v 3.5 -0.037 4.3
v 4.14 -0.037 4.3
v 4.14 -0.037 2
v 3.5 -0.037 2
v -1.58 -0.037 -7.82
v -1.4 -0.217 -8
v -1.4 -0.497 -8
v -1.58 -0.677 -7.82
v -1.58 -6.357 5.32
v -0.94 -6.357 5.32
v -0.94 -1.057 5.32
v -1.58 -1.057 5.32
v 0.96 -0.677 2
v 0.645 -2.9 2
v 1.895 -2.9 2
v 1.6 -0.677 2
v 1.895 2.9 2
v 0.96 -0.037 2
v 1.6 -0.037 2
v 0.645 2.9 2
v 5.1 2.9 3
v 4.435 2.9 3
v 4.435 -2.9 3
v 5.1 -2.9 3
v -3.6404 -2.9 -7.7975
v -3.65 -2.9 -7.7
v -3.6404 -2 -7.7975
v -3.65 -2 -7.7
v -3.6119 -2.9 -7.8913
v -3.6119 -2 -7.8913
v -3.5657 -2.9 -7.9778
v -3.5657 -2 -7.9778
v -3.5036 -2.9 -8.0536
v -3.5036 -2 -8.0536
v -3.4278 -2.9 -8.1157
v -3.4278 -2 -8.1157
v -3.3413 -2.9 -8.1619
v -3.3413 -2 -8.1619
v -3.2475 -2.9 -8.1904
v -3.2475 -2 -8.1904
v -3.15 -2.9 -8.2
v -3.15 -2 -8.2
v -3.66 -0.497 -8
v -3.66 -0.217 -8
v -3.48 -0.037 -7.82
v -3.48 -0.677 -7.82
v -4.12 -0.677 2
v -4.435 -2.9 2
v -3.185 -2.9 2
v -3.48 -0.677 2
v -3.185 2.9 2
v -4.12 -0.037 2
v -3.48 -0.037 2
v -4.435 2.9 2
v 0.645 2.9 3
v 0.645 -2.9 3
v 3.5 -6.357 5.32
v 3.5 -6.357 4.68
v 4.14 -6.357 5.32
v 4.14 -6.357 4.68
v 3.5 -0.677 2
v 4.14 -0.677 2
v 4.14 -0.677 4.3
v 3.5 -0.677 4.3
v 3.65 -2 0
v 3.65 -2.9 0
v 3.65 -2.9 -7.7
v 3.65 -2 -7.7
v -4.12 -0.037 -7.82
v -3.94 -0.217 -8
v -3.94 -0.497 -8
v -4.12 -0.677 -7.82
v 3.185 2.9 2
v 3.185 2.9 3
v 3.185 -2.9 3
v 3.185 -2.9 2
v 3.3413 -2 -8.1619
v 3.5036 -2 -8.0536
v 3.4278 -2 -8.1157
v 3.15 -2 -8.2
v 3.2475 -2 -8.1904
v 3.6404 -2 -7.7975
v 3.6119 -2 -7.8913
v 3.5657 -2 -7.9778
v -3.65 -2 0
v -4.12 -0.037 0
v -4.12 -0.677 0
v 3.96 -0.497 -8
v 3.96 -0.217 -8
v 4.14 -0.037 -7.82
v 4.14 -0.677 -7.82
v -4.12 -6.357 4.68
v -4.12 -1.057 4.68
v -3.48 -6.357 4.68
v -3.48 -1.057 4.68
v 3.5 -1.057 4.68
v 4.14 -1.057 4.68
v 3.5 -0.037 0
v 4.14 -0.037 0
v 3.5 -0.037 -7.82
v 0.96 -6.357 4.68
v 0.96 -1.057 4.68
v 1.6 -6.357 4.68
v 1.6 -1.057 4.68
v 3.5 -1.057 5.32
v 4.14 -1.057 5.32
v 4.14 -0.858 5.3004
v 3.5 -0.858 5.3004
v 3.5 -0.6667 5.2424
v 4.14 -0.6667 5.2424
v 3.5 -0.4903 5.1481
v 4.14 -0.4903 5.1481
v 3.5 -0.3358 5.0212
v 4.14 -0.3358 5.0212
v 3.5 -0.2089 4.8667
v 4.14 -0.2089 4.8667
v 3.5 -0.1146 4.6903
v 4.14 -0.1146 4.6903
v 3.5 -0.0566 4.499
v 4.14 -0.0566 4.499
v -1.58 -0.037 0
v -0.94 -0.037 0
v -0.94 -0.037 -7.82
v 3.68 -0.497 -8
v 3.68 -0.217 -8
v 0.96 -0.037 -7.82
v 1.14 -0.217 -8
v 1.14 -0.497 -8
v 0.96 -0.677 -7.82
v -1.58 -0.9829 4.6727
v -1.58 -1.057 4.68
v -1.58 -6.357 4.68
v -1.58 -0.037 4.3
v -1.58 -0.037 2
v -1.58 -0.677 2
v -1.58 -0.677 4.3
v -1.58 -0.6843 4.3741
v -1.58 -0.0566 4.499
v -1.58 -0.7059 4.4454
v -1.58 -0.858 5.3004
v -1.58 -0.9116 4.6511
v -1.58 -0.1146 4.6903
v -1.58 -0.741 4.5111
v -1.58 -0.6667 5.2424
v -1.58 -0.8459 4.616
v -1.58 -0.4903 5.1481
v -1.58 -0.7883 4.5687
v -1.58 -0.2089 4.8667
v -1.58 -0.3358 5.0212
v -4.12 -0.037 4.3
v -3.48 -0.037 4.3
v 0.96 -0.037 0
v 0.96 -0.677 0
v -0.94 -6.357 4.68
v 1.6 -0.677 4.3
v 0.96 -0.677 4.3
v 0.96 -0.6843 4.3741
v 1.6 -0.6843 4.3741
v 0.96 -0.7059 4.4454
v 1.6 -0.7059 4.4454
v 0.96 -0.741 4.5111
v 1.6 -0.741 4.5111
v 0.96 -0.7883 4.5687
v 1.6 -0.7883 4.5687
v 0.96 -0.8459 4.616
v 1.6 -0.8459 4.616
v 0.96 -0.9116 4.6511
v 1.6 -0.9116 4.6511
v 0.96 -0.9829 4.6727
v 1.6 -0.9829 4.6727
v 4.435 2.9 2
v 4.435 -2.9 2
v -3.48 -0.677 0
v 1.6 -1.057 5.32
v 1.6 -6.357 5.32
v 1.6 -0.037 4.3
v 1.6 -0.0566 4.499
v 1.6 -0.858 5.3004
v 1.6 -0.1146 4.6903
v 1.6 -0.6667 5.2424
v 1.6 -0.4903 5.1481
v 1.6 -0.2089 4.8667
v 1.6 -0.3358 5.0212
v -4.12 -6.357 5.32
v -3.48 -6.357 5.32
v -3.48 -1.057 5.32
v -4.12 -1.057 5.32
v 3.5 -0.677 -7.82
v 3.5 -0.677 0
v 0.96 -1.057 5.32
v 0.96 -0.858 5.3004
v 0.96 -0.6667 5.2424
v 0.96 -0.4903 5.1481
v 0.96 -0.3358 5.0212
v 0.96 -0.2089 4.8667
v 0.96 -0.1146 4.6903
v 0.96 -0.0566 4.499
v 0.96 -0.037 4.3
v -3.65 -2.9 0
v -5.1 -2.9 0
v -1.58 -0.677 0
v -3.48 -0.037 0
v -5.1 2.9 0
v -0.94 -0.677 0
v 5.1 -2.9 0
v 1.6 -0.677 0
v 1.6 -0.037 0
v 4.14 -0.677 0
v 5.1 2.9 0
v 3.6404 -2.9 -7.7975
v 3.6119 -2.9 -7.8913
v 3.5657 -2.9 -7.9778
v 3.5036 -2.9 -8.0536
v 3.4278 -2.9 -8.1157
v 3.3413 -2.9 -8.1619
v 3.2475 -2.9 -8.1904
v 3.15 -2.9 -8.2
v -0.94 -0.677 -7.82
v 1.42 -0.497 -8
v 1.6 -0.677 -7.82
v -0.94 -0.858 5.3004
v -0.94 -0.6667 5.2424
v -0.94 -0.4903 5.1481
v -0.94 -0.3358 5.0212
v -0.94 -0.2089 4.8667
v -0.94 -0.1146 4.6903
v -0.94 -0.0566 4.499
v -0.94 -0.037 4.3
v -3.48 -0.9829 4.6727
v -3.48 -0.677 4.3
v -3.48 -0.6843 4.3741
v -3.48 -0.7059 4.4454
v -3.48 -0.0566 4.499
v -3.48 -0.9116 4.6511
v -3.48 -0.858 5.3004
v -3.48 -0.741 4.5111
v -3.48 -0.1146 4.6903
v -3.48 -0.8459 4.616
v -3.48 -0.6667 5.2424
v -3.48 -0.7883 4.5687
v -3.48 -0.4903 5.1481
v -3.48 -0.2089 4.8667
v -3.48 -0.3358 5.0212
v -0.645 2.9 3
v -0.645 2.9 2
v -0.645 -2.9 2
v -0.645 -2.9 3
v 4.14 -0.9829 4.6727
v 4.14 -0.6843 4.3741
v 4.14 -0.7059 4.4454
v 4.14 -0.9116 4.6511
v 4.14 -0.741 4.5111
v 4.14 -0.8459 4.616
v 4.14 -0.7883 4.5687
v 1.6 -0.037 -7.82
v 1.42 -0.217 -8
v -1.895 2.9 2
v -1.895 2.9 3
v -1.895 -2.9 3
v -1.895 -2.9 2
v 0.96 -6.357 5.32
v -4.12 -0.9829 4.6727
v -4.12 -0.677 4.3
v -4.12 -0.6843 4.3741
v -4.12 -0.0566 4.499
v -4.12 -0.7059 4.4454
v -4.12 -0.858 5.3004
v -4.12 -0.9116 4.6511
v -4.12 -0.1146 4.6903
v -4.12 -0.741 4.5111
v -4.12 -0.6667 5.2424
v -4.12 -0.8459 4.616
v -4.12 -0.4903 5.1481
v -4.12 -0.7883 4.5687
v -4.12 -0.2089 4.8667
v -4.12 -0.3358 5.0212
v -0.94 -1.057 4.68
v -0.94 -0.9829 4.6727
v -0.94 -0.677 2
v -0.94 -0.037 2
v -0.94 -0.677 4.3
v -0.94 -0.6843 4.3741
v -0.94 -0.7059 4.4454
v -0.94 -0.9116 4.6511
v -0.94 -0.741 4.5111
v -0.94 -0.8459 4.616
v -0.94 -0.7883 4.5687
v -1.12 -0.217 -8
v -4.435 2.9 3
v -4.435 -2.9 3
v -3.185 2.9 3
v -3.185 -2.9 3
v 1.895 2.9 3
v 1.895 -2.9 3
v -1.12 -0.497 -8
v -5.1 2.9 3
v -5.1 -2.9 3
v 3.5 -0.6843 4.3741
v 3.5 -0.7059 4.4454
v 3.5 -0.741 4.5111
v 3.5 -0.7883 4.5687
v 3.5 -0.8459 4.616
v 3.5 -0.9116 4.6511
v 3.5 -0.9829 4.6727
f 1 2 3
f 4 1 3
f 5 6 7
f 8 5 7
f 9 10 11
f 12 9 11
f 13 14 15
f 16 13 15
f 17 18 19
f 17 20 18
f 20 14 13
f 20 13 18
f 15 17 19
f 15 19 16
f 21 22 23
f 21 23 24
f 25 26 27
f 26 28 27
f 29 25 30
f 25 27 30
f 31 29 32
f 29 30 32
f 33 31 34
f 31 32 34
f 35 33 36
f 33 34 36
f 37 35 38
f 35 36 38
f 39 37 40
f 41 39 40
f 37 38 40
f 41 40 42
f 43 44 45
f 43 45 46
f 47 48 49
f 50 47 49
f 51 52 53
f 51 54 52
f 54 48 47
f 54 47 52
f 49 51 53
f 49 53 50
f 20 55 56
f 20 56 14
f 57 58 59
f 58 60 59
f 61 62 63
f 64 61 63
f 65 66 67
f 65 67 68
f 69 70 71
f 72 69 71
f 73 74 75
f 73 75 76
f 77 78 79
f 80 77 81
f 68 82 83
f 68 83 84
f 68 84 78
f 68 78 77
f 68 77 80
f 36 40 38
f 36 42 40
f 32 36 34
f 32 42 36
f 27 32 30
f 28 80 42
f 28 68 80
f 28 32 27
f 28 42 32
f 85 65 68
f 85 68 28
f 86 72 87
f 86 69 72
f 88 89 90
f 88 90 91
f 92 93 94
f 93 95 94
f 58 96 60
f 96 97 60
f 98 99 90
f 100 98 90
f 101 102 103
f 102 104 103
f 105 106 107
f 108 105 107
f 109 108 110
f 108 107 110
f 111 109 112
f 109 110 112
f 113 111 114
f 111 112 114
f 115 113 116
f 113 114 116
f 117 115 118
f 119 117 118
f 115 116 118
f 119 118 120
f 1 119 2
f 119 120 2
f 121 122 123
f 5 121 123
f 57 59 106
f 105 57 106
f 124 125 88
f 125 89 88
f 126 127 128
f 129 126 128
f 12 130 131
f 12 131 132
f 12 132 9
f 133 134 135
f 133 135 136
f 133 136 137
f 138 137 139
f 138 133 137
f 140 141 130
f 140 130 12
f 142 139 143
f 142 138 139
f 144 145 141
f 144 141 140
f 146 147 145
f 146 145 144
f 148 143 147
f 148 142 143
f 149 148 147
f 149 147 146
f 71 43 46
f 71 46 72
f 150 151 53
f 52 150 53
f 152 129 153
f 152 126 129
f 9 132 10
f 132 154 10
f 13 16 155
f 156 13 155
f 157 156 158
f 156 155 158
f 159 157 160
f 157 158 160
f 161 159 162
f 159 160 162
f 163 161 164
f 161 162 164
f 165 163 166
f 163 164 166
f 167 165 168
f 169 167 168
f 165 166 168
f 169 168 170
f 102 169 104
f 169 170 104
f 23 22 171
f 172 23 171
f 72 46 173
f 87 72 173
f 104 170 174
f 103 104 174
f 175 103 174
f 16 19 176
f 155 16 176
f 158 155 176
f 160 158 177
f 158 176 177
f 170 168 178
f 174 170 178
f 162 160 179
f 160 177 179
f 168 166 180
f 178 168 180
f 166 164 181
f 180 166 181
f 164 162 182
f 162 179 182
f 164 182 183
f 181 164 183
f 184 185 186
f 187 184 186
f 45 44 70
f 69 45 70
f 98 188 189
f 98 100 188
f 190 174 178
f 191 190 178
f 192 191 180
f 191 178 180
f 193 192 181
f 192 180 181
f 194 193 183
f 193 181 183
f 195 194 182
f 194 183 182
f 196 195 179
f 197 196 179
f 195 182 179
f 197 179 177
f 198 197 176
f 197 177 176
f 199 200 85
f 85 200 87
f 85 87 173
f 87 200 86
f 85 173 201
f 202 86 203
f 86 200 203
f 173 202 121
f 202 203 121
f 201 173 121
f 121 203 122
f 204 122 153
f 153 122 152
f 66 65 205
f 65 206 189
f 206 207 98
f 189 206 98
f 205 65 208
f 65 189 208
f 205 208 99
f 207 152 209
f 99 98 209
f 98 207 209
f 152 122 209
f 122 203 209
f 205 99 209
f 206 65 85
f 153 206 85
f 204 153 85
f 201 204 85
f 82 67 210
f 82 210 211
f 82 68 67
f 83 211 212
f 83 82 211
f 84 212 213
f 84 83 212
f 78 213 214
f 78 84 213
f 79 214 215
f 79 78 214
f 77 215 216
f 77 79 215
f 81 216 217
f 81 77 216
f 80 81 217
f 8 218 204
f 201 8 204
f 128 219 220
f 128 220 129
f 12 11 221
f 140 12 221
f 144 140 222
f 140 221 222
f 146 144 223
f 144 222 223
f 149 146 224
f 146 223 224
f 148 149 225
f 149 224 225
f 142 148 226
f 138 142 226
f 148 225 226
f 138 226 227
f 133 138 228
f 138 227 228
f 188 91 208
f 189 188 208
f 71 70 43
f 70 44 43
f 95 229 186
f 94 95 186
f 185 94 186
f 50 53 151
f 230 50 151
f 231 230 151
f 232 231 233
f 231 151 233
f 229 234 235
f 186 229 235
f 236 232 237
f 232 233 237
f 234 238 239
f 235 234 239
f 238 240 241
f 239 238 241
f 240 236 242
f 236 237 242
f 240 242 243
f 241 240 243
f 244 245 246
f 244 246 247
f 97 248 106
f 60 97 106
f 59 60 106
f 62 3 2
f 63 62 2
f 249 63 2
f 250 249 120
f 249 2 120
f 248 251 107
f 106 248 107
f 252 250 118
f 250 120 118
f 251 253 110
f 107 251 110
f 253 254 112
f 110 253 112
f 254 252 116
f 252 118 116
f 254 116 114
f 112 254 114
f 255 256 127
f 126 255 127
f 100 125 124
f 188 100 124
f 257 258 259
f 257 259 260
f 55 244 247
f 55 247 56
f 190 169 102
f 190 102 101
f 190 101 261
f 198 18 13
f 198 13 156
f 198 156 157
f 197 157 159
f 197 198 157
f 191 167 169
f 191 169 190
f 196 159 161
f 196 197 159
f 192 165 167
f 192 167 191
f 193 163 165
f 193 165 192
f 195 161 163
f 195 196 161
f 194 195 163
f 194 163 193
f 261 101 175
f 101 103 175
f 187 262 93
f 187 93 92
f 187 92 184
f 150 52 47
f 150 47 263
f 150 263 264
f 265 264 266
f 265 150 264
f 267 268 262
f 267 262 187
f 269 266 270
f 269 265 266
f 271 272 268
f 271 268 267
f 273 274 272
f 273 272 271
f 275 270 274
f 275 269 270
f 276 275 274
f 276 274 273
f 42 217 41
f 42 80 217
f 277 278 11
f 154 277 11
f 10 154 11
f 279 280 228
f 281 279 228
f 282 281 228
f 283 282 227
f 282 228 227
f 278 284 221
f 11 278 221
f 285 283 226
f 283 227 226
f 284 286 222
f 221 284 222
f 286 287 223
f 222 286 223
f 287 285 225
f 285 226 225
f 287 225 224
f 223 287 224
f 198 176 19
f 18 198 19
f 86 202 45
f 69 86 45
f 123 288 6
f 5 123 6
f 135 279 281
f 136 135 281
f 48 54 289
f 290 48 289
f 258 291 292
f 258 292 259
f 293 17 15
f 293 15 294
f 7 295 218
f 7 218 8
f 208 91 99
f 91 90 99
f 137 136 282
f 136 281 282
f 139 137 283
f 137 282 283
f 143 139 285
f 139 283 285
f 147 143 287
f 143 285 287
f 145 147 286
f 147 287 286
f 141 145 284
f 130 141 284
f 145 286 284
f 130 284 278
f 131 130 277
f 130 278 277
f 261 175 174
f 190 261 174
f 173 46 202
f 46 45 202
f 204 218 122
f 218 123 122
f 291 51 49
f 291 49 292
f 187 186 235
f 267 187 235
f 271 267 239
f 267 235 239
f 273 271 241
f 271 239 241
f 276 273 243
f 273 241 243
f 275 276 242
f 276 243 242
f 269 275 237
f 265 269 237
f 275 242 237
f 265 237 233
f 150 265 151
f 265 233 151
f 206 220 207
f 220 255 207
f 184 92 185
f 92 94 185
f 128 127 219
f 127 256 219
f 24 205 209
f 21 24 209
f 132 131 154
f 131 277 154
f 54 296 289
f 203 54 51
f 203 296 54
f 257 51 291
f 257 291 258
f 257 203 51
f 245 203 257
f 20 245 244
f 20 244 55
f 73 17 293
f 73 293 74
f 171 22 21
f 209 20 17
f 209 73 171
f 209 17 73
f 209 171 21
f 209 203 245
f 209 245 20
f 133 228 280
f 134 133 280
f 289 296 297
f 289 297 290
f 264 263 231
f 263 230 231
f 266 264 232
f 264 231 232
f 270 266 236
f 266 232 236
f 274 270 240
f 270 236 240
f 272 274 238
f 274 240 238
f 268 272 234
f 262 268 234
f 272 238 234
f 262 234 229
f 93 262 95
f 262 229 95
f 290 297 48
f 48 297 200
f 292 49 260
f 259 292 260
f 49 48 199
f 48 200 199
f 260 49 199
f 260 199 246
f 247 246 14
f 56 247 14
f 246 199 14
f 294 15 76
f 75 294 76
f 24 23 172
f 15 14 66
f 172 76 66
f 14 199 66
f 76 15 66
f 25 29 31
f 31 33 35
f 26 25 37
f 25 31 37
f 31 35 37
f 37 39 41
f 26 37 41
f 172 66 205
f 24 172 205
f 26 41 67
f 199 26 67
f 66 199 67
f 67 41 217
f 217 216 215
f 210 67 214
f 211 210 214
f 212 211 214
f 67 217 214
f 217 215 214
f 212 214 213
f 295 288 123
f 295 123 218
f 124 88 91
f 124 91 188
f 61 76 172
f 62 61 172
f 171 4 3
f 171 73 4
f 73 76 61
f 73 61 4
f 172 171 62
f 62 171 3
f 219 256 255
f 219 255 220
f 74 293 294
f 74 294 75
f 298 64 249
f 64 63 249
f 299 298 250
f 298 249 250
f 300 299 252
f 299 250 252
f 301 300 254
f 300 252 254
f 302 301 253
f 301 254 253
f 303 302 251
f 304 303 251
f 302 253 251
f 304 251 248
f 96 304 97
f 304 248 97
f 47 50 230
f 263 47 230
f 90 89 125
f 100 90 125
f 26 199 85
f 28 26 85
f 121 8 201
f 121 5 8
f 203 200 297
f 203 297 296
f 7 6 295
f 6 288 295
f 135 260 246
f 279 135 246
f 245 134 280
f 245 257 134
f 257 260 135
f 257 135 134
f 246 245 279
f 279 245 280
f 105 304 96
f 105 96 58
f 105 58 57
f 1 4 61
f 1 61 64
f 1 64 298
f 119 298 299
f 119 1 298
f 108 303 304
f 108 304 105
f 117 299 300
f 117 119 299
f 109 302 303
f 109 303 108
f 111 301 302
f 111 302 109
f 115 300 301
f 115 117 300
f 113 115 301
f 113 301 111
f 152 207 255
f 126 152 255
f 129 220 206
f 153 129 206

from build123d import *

# Parameters (mm, degrees)
SCHIZZO1_W                   = 10.2
SCHIZZO1_H                   = 5.8
ESTRUSIONE_ESTRUSIONE1_DEPTH = 3
TAGLIO_ESTRUSIONE1_DEPTH     = 6.8
SCHIZZO3_W                   = 7.3
SCHIZZO3_H                   = 0.9
ESTRUSIONE_ESTRUSIONE2_DEPTH = 8.2
RACCORDO1_R                  = 0.5
ESTRUSIONE_ESTRUSIONE3_DEPTH = 0.32
RIPETIZIONE_A_L1_COUNT       = 3
RIPETIZIONE_A_L1_PITCH       = 2.54
RIPETIZIONE_A_L1_COL_COUNT   = 2
RIPETIZIONE_A_L1_COL_PITCH   = 2.54
SMUSSO1_SIZE                 = 0.18


with BuildPart() as part:
    # Schizzo1 → Estrusione-Estrusione1 (new body)
    with BuildSketch(Plane.XY):
        Rectangle(SCHIZZO1_W, SCHIZZO1_H)
    extrude(amount=ESTRUSIONE_ESTRUSIONE1_DEPTH)

    # Schizzo2 → Taglio-Estrusione1 (cut, through all)
    with BuildSketch(Plane(origin=(0, 2.9, 0), x_dir=(1, 0, 0), z_dir=(0, 1, 0))):
        Polygon((-4.435, -3), (-4.435, -2), (-3.185, -2), (-3.185, -3), (-1.895, -3), (-1.895, -2), (-0.645, -2), (-0.645, -3), (0.645, -3), (0.645, -2), (1.895, -2), (1.895, -3), (3.185, -3), (3.185, -2), (4.435, -2), (4.435, -3), (4.435, -3.561285121), (-4.435, -3.561285121), align=None)
    extrude(amount=-TAGLIO_ESTRUSIONE1_DEPTH, mode=Mode.SUBTRACT)

    # Schizzo3 → Estrusione-Estrusione2 (add)
    with BuildSketch(Plane(origin=(0, 0, 0), x_dir=(-1, 0, 0), z_dir=(0, 0, -1))):
        with Locations((0, -2.45)):
            Rectangle(SCHIZZO3_W, SCHIZZO3_H)
    extrude(amount=ESTRUSIONE_ESTRUSIONE2_DEPTH)

    # Raccordo1
    raccordo1_edges = [part.edges().sort_by_distance(p)[0] for p in [
        (-3.65, -2.45, -8.2),
        (3.65, -2.45, -8.2),
    ]]
    fillet(raccordo1_edges, radius=RACCORDO1_R)

    # Schizzo5 → Estrusione-Estrusione3 (add, symmetric)
    with BuildSketch(Plane(origin=(1.28, 0, 0), x_dir=(0, 0, -1), z_dir=(1, 0, 0))):
        with BuildLine():
            Line((-4.3, -0.037), (8, -0.037))
            Line((8, -0.037), (8, -0.677))
            Line((8, -0.677), (-4.3, -0.677))
            ThreePointArc((-4.3, -0.677), (-4.568700577, -0.788299423), (-4.68, -1.057))
            Line((-4.68, -1.057), (-4.68, -6.357))
            Line((-4.68, -6.357), (-5.32, -6.357))
            Line((-5.32, -6.357), (-5.32, -1.057))
            ThreePointArc((-5.32, -1.057), (-5.021248917, -0.335751083), (-4.3, -0.037))
        make_face()
    estrusione_estrusione3 = extrude(amount=ESTRUSIONE_ESTRUSIONE3_DEPTH, both=True)

    # Ripetizione a L1: Estrusione-Estrusione3 ×3
    with Locations(*[(-i * RIPETIZIONE_A_L1_PITCH, 0, 0) for i in range(1, RIPETIZIONE_A_L1_COUNT)]):
        add(estrusione_estrusione3)

    # Ripetizione a L1 col: Estrusione-Estrusione3 ×2
    with Locations(*[(i * RIPETIZIONE_A_L1_COL_PITCH, 0, 0) for i in range(1, RIPETIZIONE_A_L1_COL_COUNT)]):
        add(estrusione_estrusione3)

    # Smusso1
    smusso1_edges = [part.edges().sort_by_distance(p)[0] for p in [
        (0.96, -0.357, -8),
        (1.28, -0.677, -8),
        (1.28, -0.037, -8),
        (1.6, -0.357, -8),
        (3.5, -0.357, -8),
        (3.82, -0.677, -8),
        (3.82, -0.037, -8),
        (4.14, -0.357, -8),
        (-1.58, -0.357, -8),
        (-1.26, -0.677, -8),
        (-1.26, -0.037, -8),
        (-0.94, -0.357, -8),
        (-4.12, -0.357, -8),
        (-3.8, -0.677, -8),
        (-3.8, -0.037, -8),
        (-3.48, -0.357, -8),
    ]]
    chamfer(smusso1_edges, length=SMUSSO1_SIZE)


solid = part.part
